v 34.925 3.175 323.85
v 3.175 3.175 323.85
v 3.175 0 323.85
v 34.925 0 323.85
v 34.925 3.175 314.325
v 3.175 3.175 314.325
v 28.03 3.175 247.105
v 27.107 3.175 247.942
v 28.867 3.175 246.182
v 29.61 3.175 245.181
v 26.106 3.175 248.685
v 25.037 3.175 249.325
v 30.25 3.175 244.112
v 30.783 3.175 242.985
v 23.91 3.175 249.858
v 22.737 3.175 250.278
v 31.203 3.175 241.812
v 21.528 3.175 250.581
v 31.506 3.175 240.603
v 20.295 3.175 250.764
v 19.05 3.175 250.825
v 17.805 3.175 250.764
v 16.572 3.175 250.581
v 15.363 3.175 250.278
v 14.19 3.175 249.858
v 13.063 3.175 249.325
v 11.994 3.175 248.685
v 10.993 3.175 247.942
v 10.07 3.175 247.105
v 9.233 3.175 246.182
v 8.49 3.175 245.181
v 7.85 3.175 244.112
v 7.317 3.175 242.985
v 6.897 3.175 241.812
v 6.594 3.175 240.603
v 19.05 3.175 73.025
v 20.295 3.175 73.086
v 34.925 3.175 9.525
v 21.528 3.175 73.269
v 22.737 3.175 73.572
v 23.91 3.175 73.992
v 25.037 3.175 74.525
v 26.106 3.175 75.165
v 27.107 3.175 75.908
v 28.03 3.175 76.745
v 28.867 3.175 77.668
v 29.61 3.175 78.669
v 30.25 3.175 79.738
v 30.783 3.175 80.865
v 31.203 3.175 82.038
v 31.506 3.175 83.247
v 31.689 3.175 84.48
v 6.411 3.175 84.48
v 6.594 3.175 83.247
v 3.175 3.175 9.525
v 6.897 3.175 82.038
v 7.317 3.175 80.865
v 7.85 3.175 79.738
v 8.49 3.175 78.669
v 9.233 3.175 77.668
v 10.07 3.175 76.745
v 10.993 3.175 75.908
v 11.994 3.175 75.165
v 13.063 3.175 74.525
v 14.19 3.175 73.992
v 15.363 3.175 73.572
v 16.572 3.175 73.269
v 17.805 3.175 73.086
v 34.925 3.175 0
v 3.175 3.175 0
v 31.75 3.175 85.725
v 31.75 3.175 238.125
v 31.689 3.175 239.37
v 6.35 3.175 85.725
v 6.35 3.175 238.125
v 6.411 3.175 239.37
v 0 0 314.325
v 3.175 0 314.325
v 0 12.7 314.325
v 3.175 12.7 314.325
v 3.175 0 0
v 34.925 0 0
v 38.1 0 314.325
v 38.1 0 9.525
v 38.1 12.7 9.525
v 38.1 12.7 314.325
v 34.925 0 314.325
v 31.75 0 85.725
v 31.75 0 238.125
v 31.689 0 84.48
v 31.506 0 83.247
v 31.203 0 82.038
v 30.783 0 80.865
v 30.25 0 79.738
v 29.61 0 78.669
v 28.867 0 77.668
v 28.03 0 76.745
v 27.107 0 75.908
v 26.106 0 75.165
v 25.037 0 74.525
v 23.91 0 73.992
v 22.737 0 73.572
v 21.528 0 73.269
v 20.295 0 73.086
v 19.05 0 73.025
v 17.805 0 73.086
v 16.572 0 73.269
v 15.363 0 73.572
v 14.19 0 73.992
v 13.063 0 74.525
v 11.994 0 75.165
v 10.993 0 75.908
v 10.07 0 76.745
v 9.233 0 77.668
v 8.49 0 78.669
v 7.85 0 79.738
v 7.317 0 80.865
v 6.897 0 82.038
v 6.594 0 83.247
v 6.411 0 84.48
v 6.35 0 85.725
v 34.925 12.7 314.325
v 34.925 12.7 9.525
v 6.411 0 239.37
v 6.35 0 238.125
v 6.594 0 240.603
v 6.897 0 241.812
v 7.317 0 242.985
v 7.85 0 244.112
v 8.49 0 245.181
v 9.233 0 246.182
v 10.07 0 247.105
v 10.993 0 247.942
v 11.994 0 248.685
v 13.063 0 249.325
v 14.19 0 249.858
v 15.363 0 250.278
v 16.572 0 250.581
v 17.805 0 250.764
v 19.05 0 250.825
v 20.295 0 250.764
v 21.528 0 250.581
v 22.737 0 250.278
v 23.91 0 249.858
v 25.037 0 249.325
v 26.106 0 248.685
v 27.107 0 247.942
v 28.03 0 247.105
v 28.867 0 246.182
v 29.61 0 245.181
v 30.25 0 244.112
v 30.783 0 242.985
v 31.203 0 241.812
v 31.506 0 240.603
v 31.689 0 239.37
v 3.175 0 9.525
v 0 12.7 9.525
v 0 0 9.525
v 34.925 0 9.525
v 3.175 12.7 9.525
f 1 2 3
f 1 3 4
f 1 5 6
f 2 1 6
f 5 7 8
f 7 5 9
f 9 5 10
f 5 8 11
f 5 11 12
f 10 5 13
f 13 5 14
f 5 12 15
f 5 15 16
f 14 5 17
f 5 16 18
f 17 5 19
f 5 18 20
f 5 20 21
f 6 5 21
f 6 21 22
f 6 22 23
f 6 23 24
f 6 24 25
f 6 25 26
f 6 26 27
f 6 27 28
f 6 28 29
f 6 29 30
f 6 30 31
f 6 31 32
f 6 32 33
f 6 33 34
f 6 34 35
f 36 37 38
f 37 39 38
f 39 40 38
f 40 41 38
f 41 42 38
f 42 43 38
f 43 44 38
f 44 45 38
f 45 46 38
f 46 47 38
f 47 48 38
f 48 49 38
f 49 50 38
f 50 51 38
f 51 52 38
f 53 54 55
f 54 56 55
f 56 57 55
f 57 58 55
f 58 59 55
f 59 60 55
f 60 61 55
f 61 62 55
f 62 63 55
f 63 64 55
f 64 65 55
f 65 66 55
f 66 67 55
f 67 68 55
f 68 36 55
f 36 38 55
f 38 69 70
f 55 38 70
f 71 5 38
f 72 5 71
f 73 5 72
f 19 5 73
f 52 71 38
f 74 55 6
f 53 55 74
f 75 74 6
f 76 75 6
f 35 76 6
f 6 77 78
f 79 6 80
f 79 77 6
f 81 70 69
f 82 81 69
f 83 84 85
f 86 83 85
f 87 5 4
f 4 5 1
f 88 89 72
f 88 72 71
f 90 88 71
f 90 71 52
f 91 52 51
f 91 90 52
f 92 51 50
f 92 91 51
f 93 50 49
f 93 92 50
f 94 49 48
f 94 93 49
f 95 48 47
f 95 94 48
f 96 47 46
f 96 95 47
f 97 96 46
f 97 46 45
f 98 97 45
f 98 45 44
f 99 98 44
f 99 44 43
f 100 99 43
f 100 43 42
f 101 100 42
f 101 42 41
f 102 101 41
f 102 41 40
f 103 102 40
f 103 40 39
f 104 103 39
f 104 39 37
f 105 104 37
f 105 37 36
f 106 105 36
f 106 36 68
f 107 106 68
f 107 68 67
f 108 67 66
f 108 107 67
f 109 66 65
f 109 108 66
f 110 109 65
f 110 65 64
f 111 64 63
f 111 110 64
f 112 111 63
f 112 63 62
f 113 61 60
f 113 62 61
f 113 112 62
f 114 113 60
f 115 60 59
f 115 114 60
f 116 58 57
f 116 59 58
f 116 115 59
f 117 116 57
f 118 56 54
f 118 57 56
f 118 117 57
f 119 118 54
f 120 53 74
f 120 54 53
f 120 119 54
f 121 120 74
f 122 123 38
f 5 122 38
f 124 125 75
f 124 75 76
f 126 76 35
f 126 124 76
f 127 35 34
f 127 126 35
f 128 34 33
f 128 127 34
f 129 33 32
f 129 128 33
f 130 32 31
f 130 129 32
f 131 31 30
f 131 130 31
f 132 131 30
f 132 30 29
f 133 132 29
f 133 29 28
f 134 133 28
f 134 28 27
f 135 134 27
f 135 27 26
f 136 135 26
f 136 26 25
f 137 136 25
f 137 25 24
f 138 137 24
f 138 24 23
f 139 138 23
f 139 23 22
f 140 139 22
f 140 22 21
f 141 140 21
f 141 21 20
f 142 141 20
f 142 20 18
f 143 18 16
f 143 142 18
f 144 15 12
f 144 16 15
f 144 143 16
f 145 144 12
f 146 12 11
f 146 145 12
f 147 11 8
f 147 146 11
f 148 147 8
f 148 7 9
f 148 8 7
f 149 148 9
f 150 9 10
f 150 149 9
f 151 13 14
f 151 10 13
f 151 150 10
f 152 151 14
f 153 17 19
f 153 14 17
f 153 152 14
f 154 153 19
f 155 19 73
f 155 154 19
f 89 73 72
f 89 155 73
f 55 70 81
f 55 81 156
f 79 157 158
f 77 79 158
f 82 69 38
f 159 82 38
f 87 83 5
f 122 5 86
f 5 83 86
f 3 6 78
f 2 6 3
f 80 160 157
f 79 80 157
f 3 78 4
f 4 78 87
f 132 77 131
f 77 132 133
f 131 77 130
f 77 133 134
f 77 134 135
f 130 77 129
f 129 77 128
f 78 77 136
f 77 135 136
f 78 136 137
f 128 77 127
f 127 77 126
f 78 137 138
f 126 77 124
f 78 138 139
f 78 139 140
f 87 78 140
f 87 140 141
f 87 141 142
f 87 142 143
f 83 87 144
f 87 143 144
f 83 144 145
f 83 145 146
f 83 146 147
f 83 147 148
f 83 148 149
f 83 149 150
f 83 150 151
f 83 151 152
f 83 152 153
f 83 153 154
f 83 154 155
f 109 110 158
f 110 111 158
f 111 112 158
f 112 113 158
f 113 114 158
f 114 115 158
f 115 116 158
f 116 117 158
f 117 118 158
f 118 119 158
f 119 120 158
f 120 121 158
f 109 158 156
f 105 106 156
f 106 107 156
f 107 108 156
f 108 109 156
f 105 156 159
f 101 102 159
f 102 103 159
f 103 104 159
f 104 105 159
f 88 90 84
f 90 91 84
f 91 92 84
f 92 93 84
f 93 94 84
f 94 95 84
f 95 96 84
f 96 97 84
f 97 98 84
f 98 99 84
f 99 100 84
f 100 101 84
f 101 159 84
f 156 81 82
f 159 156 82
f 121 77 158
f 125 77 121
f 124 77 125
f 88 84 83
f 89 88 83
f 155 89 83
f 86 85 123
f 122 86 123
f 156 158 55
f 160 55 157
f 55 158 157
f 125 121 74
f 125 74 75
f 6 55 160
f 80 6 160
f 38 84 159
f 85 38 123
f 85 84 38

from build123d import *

# Parameters (mm, degrees)
BOSS_EXTRUDE1_DEPTH = 323.85
SKETCH2_W           = 9.525
SKETCH2_H           = 12.7
CUT_EXTRUDE1_DEPTH  = 3.175
CUT_EXTRUDE2_REACH  = 14.7


with BuildPart() as part:
    # Sketch1 → Boss-Extrude1 (new body)
    with BuildSketch(Plane.XY):
        Polygon((3.175, 3.175), (3.175, 12.7), (0, 12.7), (0, 0), (38.1, 0), (38.1, 12.7), (34.925, 12.7), (34.925, 3.175), align=None)
    extrude(amount=BOSS_EXTRUDE1_DEPTH)

    # Sketch2 → Cut-Extrude1 (cut)
    with BuildSketch(Plane.ZY):
        with Locations((319.0875, 6.35)):
            Rectangle(SKETCH2_W, SKETCH2_H)
        with Locations((4.7625, 6.35)):
            Rectangle(SKETCH2_W, SKETCH2_H)
    cut_extrude1 = extrude(amount=-CUT_EXTRUDE1_DEPTH, mode=Mode.SUBTRACT)

    # Mirror1: Cut-Extrude1 across plane
    add(cut_extrude1.mirror(Plane.ZY.offset(-19.05)), mode=Mode.SUBTRACT)

    # Sketch3 → Cut-Extrude2 (cut, up to next)
    with BuildSketch(Plane.XZ, mode=Mode.PRIVATE) as cut_extrude2_sk1:
        with BuildLine():
            Line((31.75, 238.125), (31.75, 85.725))
            ThreePointArc((31.75, 85.725), (19.05, 73.025), (6.35, 85.725))
            Line((6.35, 85.725), (6.35, 238.125))
            ThreePointArc((6.35, 238.125), (19.05, 250.825), (31.75, 238.125))
        make_face()
    cut_extrude2_tool1 = extrude(cut_extrude2_sk1.sketch, amount=-CUT_EXTRUDE2_REACH, mode=Mode.PRIVATE) & part.part
    add(cut_extrude2_tool1.solids().sort_by_distance((19.05, 0, 161.925))[0], mode=Mode.SUBTRACT)


solid = part.part
